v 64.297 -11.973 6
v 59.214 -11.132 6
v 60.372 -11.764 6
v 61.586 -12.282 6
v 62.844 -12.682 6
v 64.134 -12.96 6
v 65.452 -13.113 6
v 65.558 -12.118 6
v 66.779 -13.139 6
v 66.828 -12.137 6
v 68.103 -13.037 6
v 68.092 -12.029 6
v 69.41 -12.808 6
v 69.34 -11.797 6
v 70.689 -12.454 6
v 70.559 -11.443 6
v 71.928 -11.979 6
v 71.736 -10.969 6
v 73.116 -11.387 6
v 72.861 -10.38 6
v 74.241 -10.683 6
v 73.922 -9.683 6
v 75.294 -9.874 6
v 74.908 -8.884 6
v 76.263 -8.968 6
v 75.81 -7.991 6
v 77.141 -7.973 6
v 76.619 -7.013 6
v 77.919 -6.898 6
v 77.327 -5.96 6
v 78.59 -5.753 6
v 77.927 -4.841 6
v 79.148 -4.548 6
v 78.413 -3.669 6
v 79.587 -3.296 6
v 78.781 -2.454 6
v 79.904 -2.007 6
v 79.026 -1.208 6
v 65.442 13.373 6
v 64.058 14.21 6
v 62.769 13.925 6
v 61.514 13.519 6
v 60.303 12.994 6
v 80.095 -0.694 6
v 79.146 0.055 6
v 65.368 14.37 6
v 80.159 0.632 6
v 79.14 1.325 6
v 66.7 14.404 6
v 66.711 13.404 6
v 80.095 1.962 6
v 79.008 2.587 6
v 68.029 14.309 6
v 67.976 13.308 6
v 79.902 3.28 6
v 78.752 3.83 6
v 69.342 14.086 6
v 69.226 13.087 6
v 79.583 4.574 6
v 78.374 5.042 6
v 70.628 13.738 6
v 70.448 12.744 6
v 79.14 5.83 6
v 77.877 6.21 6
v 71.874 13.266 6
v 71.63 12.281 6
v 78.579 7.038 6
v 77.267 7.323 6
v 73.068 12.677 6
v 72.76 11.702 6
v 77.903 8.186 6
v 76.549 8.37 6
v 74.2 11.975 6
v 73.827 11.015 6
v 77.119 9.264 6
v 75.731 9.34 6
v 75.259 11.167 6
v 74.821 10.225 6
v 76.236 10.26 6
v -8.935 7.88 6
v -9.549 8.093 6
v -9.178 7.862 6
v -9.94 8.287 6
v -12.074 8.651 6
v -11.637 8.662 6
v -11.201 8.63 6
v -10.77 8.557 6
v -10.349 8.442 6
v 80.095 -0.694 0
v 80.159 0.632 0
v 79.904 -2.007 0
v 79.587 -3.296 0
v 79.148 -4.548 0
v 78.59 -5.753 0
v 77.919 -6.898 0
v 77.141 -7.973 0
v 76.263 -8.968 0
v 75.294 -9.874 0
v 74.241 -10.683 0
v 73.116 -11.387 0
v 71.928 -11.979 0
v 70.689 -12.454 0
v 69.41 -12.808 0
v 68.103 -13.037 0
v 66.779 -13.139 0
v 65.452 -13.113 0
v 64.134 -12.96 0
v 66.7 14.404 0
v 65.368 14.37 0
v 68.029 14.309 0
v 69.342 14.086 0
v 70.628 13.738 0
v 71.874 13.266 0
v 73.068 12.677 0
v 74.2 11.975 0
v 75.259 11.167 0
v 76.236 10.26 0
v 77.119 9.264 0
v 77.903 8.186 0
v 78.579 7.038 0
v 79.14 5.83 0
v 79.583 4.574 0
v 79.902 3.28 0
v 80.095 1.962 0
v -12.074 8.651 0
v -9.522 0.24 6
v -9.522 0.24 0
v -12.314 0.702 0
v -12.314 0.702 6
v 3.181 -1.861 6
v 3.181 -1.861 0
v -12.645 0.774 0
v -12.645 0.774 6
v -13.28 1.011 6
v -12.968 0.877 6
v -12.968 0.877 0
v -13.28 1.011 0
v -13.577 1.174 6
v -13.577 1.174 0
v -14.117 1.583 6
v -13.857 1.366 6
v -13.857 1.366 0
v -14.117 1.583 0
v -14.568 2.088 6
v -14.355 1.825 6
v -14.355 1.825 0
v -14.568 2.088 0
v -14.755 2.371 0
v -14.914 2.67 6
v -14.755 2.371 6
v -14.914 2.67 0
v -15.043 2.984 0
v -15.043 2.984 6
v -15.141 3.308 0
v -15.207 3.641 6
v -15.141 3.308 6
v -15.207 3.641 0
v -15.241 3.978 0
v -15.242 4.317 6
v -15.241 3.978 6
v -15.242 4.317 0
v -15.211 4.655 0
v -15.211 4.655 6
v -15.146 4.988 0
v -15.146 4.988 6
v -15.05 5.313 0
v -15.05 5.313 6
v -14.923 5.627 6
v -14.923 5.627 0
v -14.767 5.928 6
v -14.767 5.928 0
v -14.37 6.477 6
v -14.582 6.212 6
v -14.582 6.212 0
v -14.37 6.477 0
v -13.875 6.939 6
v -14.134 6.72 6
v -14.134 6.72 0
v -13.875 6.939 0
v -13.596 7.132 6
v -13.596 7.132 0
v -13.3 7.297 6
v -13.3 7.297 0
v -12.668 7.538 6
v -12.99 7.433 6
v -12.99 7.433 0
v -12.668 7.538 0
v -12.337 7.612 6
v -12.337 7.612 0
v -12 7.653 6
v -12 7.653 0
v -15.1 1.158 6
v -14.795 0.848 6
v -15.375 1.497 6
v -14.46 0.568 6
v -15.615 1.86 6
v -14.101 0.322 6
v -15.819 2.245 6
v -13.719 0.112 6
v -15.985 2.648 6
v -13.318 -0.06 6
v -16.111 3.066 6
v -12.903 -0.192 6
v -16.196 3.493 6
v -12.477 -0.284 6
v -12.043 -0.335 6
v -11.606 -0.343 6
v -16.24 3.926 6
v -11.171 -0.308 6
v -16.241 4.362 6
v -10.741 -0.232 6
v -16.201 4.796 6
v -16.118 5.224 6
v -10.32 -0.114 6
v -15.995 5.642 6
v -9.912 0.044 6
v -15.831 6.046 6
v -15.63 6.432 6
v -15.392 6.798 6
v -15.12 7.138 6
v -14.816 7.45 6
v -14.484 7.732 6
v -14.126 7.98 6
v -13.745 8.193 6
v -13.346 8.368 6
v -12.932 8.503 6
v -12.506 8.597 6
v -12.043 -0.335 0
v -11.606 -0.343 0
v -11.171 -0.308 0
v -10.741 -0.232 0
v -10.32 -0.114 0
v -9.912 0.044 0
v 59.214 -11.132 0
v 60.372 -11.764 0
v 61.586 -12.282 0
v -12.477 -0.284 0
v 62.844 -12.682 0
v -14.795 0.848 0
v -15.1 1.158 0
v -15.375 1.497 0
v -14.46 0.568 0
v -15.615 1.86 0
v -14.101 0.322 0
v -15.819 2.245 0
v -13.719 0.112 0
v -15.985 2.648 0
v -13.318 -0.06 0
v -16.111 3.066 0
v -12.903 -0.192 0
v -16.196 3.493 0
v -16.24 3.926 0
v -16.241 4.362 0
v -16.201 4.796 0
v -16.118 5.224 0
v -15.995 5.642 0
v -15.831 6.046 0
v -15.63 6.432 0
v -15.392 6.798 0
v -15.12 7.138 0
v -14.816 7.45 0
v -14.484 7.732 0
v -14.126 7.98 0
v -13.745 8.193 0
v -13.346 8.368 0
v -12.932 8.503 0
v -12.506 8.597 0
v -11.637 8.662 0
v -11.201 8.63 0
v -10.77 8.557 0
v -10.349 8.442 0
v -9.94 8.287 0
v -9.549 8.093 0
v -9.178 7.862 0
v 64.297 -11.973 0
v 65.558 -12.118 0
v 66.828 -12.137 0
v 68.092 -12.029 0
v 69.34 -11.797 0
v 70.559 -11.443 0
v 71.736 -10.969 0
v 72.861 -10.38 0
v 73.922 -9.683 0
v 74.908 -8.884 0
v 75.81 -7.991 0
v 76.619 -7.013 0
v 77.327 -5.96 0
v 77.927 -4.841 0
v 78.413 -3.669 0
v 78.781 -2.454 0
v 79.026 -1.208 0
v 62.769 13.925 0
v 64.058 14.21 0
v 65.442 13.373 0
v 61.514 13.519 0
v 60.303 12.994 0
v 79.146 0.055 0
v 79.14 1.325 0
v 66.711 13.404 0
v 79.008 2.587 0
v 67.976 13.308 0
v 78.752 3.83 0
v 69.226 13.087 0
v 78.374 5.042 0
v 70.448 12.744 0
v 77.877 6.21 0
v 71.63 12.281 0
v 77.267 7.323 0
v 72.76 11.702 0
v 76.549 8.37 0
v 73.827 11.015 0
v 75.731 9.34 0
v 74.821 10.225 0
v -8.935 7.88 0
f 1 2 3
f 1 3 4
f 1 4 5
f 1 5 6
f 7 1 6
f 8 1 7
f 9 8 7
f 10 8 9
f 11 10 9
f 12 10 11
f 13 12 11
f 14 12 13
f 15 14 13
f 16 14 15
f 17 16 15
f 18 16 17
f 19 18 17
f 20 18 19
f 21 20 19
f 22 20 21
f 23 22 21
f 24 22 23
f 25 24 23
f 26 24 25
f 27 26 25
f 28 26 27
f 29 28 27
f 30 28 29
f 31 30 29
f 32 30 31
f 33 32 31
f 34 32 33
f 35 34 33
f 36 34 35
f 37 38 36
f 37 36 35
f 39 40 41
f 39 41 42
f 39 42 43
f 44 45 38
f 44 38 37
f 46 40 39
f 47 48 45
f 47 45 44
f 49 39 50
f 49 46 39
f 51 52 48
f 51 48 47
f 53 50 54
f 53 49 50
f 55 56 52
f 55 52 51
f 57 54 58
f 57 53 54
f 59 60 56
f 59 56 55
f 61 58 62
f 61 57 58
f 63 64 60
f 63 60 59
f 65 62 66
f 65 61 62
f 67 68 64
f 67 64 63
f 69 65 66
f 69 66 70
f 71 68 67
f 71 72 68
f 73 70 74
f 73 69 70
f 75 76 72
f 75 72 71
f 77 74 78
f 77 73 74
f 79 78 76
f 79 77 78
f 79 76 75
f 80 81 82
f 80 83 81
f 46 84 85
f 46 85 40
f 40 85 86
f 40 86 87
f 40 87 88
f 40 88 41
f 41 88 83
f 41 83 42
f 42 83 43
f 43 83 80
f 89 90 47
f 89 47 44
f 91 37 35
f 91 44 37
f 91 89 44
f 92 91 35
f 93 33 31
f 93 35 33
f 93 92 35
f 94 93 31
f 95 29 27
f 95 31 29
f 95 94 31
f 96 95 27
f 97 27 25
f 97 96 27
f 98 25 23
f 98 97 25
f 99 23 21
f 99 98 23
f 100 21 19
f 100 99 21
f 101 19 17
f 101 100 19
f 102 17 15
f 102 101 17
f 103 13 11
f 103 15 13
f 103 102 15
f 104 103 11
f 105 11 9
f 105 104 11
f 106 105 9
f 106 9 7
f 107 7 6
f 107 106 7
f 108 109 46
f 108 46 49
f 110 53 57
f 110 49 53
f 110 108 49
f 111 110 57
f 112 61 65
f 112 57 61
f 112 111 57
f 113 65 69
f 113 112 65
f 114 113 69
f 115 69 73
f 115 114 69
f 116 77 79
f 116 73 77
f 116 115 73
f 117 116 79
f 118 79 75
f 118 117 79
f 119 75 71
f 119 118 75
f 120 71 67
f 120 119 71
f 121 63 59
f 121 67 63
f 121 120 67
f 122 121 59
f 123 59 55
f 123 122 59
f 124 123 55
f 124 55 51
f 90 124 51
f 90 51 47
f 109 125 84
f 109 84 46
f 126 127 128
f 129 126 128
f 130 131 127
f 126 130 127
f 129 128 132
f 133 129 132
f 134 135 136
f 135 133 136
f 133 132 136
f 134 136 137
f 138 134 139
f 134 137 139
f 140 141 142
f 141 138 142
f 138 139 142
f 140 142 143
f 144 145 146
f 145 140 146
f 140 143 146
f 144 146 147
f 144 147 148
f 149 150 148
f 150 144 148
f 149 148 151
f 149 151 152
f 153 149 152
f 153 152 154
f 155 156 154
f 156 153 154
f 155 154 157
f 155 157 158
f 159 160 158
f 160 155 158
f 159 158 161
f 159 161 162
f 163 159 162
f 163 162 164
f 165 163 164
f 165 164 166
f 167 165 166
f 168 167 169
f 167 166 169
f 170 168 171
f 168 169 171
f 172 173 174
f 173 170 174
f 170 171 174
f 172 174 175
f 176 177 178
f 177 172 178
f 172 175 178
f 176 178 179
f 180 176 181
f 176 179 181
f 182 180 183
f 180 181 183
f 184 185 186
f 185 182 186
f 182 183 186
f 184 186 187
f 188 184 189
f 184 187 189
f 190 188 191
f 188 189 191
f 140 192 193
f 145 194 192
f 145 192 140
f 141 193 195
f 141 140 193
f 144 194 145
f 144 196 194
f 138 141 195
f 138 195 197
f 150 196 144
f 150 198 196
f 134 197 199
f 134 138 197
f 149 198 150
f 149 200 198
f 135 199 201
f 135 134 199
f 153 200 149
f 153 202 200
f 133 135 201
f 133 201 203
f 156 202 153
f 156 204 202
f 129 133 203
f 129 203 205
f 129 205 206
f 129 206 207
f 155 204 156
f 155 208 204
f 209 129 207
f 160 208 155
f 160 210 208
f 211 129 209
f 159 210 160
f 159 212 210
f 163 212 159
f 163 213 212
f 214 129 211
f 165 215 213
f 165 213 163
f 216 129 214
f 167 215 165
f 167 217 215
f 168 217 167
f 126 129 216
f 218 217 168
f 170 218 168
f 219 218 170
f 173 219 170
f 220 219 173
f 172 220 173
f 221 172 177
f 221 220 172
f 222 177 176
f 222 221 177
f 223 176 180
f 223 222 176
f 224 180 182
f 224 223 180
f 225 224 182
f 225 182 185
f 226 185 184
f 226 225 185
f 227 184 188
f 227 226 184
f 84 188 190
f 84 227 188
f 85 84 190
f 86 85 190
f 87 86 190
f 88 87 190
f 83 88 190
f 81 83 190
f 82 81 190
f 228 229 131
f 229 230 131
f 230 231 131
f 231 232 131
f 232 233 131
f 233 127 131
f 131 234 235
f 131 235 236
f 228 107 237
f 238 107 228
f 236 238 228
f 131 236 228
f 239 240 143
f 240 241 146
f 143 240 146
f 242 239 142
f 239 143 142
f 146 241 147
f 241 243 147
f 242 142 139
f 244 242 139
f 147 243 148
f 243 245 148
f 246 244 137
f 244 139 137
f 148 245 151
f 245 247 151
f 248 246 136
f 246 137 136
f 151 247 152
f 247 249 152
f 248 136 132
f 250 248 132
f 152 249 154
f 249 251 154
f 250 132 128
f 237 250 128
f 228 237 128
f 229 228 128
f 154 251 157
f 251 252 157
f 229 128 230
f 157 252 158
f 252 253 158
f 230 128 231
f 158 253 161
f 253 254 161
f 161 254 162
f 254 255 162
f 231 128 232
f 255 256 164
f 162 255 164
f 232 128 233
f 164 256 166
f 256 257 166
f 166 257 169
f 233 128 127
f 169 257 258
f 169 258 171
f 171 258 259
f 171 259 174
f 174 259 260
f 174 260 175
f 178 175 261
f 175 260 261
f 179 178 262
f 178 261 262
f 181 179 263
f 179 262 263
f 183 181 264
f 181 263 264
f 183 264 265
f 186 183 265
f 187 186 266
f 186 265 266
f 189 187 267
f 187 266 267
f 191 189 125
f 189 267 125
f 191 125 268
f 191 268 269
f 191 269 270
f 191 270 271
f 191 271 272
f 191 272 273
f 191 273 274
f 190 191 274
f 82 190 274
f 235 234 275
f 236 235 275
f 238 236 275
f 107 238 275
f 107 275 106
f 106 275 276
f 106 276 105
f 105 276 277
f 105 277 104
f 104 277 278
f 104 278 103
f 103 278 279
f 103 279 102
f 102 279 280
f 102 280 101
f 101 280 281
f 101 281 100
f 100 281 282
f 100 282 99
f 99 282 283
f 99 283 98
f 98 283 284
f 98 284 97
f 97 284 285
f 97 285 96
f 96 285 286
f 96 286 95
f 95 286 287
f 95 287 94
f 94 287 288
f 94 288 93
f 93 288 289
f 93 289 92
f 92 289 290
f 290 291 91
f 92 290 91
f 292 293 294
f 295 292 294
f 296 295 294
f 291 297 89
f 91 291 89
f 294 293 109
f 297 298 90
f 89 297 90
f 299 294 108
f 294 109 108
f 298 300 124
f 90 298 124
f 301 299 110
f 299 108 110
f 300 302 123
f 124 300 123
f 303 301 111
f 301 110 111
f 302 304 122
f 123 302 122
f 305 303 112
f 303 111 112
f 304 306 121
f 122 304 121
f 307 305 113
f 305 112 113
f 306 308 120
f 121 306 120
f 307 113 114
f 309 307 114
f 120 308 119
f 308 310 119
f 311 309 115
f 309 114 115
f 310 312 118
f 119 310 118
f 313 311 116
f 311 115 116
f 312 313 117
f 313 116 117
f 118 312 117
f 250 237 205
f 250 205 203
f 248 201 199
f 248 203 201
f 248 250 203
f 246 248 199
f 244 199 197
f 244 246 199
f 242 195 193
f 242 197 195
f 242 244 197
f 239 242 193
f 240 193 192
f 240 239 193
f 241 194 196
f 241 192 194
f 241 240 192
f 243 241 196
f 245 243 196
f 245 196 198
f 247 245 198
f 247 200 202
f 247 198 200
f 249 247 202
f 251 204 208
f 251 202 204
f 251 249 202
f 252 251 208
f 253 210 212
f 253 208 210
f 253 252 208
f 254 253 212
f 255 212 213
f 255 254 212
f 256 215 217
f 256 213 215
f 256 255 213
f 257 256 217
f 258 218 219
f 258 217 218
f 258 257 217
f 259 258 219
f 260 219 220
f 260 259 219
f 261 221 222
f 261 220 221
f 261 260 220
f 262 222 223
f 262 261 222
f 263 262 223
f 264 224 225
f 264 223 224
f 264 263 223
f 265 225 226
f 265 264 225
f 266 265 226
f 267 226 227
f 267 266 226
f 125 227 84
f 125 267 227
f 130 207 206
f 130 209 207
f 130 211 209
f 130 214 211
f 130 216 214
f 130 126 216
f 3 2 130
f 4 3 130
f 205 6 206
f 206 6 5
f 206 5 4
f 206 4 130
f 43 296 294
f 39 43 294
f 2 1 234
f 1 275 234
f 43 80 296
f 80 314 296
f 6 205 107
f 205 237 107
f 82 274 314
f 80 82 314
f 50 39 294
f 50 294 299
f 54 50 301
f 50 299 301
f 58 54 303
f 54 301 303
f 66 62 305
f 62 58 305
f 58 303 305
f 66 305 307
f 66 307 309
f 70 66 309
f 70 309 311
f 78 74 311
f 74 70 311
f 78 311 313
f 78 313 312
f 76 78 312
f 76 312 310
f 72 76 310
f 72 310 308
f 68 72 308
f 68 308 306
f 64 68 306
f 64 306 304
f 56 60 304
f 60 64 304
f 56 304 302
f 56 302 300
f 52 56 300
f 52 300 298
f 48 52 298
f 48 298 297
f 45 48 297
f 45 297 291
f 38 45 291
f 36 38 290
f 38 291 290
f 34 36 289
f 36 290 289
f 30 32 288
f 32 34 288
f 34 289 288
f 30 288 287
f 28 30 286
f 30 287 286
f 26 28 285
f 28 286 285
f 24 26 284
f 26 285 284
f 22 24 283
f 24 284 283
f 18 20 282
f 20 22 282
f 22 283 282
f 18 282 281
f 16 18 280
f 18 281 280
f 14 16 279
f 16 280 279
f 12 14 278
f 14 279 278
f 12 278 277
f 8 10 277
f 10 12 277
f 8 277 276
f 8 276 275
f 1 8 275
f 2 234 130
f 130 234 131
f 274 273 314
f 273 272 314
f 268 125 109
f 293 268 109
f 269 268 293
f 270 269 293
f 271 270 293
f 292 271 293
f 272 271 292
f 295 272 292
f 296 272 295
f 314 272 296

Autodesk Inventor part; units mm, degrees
ref_plane "YZ Plane" through (0, 0, 0) normal (1, 0, 0) x (0, 1, 0)
ref_plane "XZ Plane" through (0, 0, 0) normal (0, 1, 0) x (-1, 0, 0)
ref_plane "XY Plane" through (0, 0, 0) normal (0, 0, 1) x (1, 0, 0)
sketch "Sketch1" plane through (0, 0, 0) normal (0, 0, 1) x (1, 0, 0)
  circle A0 centre (66.3829, 0.6317) radius 13.7761 projected
  line L0 (-12.0738, 8.6506) -> (65.3682, 14.3704)
  line L1 (-12.4772, -0.2842) -> (64.1342, -12.9596)
  line L2 (-12.0001, 7.6533) -> (-8.9346, 7.8797)
  arc A1 (64.2974, -11.973) -> (65.4418, 13.3731) centre (66.3829, 0.6317) ccw
  line L3 (64.2974, -11.973) -> (59.2137, -11.1319)
  arc A2 (-12.0001, 7.6533) -> (-12.314, 0.7024) centre (-11.7421, 4.1591) ccw
  line L4 (3.1814, -1.8614) -> (-12.314, 0.7024)
  line L5 (-8.9346, 7.8797) -> (60.3029, 12.9936)
  line L6 (59.2137, -11.1319) -> (3.1814, -1.8614)
  line L7 (60.3029, 12.9936) -> (65.4418, 13.3731)
  arc A3 (-9.1781, 7.8617) -> (-9.5222, 0.2405) centre (-11.7421, 4.1591) ccw
  arc A4 (-9.5222, 0.2405) -> (-9.1781, 7.8617) centre (-11.7421, 4.1591) ccw
  point P0 (0, 0)
  dimension "d0" = 1
extrude "Extrusion2" add sketch "Sketch1" along normal blind 6 contours A0 L3 A1 L7 | A0 L5 L2 A3 L0 | L1 A3 L4 L6 A0 | A3 L2 A2 L4 picked at (66.3473, -12.7206)
properties part number "Belt"
